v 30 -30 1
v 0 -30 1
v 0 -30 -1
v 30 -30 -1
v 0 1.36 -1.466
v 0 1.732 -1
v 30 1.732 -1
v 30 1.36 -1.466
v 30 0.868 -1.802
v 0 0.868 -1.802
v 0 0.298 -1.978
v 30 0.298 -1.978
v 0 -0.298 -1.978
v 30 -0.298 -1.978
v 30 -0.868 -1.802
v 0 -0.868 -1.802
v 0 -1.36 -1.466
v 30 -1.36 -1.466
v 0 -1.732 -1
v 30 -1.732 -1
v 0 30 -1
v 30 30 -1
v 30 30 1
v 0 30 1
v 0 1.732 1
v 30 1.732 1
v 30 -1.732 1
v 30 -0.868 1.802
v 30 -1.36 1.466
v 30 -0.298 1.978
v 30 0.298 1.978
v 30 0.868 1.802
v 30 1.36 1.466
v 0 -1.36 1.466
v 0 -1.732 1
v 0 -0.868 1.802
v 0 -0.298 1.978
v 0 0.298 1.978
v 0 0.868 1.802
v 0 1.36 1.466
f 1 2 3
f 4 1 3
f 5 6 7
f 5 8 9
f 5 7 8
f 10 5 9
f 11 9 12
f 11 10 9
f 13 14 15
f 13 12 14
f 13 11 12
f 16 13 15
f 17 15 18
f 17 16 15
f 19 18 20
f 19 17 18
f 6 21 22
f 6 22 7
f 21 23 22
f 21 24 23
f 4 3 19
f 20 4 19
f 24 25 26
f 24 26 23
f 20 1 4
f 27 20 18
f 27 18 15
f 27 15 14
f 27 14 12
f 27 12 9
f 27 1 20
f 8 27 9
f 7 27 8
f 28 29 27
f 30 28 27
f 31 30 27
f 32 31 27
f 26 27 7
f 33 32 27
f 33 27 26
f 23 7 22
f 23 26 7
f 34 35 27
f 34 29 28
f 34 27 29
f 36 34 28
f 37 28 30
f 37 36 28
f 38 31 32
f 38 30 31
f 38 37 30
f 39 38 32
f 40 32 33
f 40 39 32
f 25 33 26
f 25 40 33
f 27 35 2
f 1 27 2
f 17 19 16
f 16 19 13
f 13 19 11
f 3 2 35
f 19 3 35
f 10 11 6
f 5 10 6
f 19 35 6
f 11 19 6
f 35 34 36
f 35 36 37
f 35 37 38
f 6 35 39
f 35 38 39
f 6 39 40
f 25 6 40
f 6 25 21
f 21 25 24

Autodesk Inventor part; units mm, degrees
ref_plane "YZ Plane" through (0, 0, 0) normal (1, 0, 0) x (0, 1, 0)
ref_plane "XZ Plane" through (0, 0, 0) normal (0, 1, 0) x (-1, 0, 0)
ref_plane "XY Plane" through (0, 0, 0) normal (0, 0, 1) x (1, 0, 0)
sketch "Sketch1" plane through (0, 0, 0) normal (1, 0, 0) x (0, 1, 0)
  line L0 (1.7321, 1) -> (30, 1)
  line L1 (30, 1) -> (30, -1)
  line L2 (30, -1) -> (1.7321, -1)
  line L3 (-1.7321, 1) -> (-30, 1)
  line L4 (-30, 1) -> (-30, -1)
  line L5 (-30, -1) -> (-1.7321, -1)
  arc A0 (1.7321, 1) -> (-1.7321, 1) centre (0, 0) ccw
  arc A1 (-1.7321, -1) -> (1.7321, -1) centre (0, 0) ccw
  dimension "d1" = 2
  dimension "d26" = 30
  dimension "d27" = 30
extrude "Extrusion1" add sketch "Sketch1" along normal blind 30
properties part number "Flat Hinge"
